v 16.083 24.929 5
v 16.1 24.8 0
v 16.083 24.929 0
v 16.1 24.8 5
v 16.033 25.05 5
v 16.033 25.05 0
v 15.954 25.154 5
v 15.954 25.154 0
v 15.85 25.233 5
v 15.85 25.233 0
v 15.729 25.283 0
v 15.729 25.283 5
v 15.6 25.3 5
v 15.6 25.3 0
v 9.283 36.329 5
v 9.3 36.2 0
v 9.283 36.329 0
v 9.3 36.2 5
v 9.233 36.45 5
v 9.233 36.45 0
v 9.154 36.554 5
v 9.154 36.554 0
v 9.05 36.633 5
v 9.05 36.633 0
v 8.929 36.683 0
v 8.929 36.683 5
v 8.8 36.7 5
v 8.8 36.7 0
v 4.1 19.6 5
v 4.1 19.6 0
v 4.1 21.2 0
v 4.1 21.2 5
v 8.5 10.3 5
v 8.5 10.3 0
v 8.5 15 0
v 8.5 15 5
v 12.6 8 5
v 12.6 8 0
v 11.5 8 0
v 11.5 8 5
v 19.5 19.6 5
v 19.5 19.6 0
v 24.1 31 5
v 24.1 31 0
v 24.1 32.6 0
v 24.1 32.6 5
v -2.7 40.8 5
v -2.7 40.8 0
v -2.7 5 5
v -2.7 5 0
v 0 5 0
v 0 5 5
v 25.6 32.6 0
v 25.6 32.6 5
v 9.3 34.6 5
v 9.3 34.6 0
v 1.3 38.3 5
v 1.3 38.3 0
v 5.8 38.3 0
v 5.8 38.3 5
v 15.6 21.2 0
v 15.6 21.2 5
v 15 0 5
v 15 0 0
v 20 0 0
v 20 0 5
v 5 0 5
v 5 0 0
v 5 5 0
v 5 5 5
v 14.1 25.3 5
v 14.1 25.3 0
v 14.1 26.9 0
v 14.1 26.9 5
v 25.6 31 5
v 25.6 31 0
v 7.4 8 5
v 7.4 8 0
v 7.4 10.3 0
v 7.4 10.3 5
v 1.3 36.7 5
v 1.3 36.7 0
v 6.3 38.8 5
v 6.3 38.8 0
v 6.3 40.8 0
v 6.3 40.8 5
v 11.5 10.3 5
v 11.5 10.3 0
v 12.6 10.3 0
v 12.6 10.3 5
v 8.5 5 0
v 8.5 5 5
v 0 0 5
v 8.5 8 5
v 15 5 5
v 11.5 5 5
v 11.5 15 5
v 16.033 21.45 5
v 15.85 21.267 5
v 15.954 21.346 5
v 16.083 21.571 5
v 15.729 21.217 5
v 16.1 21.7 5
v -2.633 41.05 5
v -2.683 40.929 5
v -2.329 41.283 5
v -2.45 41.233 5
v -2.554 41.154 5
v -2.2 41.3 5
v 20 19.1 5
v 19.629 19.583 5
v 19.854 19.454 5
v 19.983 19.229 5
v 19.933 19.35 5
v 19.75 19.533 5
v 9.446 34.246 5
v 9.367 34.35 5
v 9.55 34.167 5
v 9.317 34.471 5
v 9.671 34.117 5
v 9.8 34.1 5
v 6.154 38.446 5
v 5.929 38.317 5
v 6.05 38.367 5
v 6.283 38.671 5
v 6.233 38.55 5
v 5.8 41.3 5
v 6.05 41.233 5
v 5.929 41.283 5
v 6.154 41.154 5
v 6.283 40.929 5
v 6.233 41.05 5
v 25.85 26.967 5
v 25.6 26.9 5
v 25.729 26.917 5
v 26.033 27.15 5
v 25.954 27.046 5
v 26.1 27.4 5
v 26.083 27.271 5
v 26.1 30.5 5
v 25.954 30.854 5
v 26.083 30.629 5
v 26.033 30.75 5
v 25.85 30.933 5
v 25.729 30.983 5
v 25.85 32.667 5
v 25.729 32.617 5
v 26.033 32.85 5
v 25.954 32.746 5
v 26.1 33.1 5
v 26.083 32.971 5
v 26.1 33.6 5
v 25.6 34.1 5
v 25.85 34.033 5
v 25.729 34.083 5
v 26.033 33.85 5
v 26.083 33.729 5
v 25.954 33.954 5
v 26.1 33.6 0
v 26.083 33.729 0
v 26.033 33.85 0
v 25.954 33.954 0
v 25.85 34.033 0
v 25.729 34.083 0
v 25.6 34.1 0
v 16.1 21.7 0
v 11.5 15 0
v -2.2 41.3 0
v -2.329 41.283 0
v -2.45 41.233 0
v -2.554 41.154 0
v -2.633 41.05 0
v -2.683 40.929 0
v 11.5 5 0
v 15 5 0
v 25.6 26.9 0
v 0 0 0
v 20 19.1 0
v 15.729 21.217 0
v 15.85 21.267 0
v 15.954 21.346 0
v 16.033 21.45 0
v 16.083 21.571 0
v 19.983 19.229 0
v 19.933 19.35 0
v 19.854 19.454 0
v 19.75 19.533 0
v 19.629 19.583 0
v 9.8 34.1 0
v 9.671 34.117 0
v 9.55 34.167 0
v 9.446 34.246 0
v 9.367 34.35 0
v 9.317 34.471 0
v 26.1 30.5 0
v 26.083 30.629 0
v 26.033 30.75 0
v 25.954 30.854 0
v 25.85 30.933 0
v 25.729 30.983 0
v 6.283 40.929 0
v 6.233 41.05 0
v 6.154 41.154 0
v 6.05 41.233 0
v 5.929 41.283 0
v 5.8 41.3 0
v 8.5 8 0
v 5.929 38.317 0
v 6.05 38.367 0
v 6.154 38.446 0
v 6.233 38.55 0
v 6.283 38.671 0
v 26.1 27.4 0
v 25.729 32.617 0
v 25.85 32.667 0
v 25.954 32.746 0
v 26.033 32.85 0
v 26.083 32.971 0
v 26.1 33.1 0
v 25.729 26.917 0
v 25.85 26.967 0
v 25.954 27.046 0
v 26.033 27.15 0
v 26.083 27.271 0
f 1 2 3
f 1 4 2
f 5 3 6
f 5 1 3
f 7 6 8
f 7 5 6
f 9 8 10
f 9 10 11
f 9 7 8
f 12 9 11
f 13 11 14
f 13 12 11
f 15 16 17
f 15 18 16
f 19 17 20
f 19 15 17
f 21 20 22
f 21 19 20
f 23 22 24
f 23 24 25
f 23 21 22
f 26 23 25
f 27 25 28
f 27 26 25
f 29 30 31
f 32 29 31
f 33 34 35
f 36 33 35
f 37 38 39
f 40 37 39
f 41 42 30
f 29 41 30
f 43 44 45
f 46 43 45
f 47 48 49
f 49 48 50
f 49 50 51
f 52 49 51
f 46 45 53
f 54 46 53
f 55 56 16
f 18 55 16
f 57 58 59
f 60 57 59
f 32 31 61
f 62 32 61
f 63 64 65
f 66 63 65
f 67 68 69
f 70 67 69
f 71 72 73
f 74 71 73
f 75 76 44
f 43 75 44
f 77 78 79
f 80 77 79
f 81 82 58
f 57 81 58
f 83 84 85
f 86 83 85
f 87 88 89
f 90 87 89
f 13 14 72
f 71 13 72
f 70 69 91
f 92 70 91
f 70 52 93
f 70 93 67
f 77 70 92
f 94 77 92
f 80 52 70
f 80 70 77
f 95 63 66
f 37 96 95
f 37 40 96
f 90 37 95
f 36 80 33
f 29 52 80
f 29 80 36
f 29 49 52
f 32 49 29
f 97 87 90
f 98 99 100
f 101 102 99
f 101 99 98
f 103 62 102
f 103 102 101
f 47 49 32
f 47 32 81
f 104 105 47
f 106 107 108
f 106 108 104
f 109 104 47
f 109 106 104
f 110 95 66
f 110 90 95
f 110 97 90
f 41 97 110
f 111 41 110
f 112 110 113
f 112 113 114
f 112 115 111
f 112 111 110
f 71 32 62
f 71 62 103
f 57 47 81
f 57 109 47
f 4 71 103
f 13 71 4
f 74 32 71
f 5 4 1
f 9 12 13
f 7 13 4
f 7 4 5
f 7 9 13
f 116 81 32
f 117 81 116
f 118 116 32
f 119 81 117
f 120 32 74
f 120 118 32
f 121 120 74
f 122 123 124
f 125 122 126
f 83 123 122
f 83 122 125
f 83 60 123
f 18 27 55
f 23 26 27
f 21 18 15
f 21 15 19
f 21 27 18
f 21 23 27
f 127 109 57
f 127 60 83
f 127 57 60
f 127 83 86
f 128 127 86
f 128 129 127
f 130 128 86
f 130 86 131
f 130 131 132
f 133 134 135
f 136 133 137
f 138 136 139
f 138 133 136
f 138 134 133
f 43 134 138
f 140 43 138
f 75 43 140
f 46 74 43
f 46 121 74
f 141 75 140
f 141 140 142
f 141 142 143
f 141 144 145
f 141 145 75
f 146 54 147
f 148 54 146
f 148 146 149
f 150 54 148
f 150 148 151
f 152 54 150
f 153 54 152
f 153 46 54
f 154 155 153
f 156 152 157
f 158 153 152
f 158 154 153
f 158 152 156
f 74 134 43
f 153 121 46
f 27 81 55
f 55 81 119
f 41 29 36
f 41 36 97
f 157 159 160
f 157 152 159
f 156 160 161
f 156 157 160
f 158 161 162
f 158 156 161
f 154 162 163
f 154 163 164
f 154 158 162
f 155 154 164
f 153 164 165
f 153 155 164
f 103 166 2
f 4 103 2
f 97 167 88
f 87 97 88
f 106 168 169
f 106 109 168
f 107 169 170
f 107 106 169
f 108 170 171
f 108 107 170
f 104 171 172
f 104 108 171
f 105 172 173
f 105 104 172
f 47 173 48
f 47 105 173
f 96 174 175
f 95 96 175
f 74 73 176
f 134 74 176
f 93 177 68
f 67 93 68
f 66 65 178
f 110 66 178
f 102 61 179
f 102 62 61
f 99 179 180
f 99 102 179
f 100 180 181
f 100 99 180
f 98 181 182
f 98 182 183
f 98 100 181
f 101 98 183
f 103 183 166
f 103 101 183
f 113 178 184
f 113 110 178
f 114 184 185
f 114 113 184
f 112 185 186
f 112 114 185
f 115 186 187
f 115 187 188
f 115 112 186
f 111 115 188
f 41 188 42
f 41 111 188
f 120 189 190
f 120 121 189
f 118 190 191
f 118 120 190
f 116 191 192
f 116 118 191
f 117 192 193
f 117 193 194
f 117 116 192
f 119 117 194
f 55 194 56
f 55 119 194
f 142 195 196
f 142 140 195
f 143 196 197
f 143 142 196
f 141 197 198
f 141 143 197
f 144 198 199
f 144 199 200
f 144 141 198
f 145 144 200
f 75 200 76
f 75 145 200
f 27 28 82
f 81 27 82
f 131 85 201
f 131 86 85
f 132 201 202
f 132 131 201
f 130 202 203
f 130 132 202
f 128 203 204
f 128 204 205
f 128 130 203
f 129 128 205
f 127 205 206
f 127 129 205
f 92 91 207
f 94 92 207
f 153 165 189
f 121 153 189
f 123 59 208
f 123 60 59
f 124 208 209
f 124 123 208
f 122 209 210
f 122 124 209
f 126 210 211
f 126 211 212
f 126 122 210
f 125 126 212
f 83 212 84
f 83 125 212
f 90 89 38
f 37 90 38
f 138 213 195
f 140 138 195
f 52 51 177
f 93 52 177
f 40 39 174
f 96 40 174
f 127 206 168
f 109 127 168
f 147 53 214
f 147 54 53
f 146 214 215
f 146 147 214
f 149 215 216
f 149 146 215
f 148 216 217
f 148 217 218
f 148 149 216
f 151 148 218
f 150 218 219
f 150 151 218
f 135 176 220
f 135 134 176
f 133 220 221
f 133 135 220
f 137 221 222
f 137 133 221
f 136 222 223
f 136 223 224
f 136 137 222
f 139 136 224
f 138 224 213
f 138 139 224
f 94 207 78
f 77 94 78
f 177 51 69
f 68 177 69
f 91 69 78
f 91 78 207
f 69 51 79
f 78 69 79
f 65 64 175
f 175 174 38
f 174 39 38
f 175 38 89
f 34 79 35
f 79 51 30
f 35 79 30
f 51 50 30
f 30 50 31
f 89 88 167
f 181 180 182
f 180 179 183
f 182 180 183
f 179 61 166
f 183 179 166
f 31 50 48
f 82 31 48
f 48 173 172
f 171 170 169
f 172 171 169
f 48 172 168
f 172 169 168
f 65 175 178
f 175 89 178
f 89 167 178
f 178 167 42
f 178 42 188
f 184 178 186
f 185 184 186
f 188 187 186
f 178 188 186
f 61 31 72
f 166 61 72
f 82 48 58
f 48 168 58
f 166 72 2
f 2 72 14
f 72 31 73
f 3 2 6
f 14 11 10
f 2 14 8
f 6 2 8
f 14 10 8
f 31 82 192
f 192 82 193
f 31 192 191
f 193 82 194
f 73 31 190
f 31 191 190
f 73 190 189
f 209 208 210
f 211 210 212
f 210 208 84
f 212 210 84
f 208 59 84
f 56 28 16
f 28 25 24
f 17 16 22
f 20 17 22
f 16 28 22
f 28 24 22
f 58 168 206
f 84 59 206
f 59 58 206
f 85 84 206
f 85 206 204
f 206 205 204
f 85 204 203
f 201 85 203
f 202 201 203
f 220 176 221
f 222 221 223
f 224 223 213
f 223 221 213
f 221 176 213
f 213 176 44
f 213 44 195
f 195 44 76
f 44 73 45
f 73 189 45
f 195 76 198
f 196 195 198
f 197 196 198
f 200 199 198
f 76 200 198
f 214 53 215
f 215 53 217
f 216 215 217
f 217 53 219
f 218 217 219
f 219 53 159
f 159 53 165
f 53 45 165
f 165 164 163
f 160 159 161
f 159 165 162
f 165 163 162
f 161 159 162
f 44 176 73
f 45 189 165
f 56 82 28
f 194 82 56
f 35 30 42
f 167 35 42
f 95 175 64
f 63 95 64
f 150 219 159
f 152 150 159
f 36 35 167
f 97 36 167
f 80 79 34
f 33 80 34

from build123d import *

# Parameters (mm, degrees)
BOSS_EXTRUDE1_DEPTH = 5
FILLET3_R           = 0.5


with BuildPart() as part:
    # Sketch1 → Boss-Extrude1 (new body)
    with BuildSketch(Plane.XY):
        Polygon((4.1, 19.6), (4.1, 21.2), (16.1, 21.2), (16.1, 25.3), (14.1, 25.3), (14.1, 26.9), (26.1, 26.9), (26.1, 31), (24.1, 31), (24.1, 32.6), (26.1, 32.6), (26.1, 34.1), (9.3, 34.1), (9.3, 36.7), (1.3, 36.7), (1.3, 38.3), (6.3, 38.3), (6.3, 41.3), (-2.7, 41.3), (-2.7, 5), (0, 5), (0, 0), (5, 0), (5, 5), (8.5, 5), (8.5, 8), (7.4, 8), (7.4, 10.3), (8.5, 10.3), (8.5, 15), (11.5, 15), (11.5, 10.3), (12.6, 10.3), (12.6, 8), (11.5, 8), (11.5, 5), (15, 5), (15, 0), (20, 0), (20, 5), (20, 19.6), align=None)
    extrude(amount=BOSS_EXTRUDE1_DEPTH)

    # Fillet3
    fillet3_edges = [part.edges().sort_by_distance(p)[0] for p in [
        (-2.7, 41.3, 2.5),
        (6.3, 41.3, 2.5),
        (6.3, 38.3, 2.5),
        (9.3, 36.7, 2.5),
        (9.3, 34.1, 2.5),
        (26.1, 34.1, 2.5),
        (26.1, 32.6, 2.5),
        (26.1, 31, 2.5),
        (26.1, 26.9, 2.5),
        (16.1, 25.3, 2.5),
        (16.1, 21.2, 2.5),
        (20, 19.6, 2.5),
    ]]
    fillet(fillet3_edges, radius=FILLET3_R)


solid = part.part
